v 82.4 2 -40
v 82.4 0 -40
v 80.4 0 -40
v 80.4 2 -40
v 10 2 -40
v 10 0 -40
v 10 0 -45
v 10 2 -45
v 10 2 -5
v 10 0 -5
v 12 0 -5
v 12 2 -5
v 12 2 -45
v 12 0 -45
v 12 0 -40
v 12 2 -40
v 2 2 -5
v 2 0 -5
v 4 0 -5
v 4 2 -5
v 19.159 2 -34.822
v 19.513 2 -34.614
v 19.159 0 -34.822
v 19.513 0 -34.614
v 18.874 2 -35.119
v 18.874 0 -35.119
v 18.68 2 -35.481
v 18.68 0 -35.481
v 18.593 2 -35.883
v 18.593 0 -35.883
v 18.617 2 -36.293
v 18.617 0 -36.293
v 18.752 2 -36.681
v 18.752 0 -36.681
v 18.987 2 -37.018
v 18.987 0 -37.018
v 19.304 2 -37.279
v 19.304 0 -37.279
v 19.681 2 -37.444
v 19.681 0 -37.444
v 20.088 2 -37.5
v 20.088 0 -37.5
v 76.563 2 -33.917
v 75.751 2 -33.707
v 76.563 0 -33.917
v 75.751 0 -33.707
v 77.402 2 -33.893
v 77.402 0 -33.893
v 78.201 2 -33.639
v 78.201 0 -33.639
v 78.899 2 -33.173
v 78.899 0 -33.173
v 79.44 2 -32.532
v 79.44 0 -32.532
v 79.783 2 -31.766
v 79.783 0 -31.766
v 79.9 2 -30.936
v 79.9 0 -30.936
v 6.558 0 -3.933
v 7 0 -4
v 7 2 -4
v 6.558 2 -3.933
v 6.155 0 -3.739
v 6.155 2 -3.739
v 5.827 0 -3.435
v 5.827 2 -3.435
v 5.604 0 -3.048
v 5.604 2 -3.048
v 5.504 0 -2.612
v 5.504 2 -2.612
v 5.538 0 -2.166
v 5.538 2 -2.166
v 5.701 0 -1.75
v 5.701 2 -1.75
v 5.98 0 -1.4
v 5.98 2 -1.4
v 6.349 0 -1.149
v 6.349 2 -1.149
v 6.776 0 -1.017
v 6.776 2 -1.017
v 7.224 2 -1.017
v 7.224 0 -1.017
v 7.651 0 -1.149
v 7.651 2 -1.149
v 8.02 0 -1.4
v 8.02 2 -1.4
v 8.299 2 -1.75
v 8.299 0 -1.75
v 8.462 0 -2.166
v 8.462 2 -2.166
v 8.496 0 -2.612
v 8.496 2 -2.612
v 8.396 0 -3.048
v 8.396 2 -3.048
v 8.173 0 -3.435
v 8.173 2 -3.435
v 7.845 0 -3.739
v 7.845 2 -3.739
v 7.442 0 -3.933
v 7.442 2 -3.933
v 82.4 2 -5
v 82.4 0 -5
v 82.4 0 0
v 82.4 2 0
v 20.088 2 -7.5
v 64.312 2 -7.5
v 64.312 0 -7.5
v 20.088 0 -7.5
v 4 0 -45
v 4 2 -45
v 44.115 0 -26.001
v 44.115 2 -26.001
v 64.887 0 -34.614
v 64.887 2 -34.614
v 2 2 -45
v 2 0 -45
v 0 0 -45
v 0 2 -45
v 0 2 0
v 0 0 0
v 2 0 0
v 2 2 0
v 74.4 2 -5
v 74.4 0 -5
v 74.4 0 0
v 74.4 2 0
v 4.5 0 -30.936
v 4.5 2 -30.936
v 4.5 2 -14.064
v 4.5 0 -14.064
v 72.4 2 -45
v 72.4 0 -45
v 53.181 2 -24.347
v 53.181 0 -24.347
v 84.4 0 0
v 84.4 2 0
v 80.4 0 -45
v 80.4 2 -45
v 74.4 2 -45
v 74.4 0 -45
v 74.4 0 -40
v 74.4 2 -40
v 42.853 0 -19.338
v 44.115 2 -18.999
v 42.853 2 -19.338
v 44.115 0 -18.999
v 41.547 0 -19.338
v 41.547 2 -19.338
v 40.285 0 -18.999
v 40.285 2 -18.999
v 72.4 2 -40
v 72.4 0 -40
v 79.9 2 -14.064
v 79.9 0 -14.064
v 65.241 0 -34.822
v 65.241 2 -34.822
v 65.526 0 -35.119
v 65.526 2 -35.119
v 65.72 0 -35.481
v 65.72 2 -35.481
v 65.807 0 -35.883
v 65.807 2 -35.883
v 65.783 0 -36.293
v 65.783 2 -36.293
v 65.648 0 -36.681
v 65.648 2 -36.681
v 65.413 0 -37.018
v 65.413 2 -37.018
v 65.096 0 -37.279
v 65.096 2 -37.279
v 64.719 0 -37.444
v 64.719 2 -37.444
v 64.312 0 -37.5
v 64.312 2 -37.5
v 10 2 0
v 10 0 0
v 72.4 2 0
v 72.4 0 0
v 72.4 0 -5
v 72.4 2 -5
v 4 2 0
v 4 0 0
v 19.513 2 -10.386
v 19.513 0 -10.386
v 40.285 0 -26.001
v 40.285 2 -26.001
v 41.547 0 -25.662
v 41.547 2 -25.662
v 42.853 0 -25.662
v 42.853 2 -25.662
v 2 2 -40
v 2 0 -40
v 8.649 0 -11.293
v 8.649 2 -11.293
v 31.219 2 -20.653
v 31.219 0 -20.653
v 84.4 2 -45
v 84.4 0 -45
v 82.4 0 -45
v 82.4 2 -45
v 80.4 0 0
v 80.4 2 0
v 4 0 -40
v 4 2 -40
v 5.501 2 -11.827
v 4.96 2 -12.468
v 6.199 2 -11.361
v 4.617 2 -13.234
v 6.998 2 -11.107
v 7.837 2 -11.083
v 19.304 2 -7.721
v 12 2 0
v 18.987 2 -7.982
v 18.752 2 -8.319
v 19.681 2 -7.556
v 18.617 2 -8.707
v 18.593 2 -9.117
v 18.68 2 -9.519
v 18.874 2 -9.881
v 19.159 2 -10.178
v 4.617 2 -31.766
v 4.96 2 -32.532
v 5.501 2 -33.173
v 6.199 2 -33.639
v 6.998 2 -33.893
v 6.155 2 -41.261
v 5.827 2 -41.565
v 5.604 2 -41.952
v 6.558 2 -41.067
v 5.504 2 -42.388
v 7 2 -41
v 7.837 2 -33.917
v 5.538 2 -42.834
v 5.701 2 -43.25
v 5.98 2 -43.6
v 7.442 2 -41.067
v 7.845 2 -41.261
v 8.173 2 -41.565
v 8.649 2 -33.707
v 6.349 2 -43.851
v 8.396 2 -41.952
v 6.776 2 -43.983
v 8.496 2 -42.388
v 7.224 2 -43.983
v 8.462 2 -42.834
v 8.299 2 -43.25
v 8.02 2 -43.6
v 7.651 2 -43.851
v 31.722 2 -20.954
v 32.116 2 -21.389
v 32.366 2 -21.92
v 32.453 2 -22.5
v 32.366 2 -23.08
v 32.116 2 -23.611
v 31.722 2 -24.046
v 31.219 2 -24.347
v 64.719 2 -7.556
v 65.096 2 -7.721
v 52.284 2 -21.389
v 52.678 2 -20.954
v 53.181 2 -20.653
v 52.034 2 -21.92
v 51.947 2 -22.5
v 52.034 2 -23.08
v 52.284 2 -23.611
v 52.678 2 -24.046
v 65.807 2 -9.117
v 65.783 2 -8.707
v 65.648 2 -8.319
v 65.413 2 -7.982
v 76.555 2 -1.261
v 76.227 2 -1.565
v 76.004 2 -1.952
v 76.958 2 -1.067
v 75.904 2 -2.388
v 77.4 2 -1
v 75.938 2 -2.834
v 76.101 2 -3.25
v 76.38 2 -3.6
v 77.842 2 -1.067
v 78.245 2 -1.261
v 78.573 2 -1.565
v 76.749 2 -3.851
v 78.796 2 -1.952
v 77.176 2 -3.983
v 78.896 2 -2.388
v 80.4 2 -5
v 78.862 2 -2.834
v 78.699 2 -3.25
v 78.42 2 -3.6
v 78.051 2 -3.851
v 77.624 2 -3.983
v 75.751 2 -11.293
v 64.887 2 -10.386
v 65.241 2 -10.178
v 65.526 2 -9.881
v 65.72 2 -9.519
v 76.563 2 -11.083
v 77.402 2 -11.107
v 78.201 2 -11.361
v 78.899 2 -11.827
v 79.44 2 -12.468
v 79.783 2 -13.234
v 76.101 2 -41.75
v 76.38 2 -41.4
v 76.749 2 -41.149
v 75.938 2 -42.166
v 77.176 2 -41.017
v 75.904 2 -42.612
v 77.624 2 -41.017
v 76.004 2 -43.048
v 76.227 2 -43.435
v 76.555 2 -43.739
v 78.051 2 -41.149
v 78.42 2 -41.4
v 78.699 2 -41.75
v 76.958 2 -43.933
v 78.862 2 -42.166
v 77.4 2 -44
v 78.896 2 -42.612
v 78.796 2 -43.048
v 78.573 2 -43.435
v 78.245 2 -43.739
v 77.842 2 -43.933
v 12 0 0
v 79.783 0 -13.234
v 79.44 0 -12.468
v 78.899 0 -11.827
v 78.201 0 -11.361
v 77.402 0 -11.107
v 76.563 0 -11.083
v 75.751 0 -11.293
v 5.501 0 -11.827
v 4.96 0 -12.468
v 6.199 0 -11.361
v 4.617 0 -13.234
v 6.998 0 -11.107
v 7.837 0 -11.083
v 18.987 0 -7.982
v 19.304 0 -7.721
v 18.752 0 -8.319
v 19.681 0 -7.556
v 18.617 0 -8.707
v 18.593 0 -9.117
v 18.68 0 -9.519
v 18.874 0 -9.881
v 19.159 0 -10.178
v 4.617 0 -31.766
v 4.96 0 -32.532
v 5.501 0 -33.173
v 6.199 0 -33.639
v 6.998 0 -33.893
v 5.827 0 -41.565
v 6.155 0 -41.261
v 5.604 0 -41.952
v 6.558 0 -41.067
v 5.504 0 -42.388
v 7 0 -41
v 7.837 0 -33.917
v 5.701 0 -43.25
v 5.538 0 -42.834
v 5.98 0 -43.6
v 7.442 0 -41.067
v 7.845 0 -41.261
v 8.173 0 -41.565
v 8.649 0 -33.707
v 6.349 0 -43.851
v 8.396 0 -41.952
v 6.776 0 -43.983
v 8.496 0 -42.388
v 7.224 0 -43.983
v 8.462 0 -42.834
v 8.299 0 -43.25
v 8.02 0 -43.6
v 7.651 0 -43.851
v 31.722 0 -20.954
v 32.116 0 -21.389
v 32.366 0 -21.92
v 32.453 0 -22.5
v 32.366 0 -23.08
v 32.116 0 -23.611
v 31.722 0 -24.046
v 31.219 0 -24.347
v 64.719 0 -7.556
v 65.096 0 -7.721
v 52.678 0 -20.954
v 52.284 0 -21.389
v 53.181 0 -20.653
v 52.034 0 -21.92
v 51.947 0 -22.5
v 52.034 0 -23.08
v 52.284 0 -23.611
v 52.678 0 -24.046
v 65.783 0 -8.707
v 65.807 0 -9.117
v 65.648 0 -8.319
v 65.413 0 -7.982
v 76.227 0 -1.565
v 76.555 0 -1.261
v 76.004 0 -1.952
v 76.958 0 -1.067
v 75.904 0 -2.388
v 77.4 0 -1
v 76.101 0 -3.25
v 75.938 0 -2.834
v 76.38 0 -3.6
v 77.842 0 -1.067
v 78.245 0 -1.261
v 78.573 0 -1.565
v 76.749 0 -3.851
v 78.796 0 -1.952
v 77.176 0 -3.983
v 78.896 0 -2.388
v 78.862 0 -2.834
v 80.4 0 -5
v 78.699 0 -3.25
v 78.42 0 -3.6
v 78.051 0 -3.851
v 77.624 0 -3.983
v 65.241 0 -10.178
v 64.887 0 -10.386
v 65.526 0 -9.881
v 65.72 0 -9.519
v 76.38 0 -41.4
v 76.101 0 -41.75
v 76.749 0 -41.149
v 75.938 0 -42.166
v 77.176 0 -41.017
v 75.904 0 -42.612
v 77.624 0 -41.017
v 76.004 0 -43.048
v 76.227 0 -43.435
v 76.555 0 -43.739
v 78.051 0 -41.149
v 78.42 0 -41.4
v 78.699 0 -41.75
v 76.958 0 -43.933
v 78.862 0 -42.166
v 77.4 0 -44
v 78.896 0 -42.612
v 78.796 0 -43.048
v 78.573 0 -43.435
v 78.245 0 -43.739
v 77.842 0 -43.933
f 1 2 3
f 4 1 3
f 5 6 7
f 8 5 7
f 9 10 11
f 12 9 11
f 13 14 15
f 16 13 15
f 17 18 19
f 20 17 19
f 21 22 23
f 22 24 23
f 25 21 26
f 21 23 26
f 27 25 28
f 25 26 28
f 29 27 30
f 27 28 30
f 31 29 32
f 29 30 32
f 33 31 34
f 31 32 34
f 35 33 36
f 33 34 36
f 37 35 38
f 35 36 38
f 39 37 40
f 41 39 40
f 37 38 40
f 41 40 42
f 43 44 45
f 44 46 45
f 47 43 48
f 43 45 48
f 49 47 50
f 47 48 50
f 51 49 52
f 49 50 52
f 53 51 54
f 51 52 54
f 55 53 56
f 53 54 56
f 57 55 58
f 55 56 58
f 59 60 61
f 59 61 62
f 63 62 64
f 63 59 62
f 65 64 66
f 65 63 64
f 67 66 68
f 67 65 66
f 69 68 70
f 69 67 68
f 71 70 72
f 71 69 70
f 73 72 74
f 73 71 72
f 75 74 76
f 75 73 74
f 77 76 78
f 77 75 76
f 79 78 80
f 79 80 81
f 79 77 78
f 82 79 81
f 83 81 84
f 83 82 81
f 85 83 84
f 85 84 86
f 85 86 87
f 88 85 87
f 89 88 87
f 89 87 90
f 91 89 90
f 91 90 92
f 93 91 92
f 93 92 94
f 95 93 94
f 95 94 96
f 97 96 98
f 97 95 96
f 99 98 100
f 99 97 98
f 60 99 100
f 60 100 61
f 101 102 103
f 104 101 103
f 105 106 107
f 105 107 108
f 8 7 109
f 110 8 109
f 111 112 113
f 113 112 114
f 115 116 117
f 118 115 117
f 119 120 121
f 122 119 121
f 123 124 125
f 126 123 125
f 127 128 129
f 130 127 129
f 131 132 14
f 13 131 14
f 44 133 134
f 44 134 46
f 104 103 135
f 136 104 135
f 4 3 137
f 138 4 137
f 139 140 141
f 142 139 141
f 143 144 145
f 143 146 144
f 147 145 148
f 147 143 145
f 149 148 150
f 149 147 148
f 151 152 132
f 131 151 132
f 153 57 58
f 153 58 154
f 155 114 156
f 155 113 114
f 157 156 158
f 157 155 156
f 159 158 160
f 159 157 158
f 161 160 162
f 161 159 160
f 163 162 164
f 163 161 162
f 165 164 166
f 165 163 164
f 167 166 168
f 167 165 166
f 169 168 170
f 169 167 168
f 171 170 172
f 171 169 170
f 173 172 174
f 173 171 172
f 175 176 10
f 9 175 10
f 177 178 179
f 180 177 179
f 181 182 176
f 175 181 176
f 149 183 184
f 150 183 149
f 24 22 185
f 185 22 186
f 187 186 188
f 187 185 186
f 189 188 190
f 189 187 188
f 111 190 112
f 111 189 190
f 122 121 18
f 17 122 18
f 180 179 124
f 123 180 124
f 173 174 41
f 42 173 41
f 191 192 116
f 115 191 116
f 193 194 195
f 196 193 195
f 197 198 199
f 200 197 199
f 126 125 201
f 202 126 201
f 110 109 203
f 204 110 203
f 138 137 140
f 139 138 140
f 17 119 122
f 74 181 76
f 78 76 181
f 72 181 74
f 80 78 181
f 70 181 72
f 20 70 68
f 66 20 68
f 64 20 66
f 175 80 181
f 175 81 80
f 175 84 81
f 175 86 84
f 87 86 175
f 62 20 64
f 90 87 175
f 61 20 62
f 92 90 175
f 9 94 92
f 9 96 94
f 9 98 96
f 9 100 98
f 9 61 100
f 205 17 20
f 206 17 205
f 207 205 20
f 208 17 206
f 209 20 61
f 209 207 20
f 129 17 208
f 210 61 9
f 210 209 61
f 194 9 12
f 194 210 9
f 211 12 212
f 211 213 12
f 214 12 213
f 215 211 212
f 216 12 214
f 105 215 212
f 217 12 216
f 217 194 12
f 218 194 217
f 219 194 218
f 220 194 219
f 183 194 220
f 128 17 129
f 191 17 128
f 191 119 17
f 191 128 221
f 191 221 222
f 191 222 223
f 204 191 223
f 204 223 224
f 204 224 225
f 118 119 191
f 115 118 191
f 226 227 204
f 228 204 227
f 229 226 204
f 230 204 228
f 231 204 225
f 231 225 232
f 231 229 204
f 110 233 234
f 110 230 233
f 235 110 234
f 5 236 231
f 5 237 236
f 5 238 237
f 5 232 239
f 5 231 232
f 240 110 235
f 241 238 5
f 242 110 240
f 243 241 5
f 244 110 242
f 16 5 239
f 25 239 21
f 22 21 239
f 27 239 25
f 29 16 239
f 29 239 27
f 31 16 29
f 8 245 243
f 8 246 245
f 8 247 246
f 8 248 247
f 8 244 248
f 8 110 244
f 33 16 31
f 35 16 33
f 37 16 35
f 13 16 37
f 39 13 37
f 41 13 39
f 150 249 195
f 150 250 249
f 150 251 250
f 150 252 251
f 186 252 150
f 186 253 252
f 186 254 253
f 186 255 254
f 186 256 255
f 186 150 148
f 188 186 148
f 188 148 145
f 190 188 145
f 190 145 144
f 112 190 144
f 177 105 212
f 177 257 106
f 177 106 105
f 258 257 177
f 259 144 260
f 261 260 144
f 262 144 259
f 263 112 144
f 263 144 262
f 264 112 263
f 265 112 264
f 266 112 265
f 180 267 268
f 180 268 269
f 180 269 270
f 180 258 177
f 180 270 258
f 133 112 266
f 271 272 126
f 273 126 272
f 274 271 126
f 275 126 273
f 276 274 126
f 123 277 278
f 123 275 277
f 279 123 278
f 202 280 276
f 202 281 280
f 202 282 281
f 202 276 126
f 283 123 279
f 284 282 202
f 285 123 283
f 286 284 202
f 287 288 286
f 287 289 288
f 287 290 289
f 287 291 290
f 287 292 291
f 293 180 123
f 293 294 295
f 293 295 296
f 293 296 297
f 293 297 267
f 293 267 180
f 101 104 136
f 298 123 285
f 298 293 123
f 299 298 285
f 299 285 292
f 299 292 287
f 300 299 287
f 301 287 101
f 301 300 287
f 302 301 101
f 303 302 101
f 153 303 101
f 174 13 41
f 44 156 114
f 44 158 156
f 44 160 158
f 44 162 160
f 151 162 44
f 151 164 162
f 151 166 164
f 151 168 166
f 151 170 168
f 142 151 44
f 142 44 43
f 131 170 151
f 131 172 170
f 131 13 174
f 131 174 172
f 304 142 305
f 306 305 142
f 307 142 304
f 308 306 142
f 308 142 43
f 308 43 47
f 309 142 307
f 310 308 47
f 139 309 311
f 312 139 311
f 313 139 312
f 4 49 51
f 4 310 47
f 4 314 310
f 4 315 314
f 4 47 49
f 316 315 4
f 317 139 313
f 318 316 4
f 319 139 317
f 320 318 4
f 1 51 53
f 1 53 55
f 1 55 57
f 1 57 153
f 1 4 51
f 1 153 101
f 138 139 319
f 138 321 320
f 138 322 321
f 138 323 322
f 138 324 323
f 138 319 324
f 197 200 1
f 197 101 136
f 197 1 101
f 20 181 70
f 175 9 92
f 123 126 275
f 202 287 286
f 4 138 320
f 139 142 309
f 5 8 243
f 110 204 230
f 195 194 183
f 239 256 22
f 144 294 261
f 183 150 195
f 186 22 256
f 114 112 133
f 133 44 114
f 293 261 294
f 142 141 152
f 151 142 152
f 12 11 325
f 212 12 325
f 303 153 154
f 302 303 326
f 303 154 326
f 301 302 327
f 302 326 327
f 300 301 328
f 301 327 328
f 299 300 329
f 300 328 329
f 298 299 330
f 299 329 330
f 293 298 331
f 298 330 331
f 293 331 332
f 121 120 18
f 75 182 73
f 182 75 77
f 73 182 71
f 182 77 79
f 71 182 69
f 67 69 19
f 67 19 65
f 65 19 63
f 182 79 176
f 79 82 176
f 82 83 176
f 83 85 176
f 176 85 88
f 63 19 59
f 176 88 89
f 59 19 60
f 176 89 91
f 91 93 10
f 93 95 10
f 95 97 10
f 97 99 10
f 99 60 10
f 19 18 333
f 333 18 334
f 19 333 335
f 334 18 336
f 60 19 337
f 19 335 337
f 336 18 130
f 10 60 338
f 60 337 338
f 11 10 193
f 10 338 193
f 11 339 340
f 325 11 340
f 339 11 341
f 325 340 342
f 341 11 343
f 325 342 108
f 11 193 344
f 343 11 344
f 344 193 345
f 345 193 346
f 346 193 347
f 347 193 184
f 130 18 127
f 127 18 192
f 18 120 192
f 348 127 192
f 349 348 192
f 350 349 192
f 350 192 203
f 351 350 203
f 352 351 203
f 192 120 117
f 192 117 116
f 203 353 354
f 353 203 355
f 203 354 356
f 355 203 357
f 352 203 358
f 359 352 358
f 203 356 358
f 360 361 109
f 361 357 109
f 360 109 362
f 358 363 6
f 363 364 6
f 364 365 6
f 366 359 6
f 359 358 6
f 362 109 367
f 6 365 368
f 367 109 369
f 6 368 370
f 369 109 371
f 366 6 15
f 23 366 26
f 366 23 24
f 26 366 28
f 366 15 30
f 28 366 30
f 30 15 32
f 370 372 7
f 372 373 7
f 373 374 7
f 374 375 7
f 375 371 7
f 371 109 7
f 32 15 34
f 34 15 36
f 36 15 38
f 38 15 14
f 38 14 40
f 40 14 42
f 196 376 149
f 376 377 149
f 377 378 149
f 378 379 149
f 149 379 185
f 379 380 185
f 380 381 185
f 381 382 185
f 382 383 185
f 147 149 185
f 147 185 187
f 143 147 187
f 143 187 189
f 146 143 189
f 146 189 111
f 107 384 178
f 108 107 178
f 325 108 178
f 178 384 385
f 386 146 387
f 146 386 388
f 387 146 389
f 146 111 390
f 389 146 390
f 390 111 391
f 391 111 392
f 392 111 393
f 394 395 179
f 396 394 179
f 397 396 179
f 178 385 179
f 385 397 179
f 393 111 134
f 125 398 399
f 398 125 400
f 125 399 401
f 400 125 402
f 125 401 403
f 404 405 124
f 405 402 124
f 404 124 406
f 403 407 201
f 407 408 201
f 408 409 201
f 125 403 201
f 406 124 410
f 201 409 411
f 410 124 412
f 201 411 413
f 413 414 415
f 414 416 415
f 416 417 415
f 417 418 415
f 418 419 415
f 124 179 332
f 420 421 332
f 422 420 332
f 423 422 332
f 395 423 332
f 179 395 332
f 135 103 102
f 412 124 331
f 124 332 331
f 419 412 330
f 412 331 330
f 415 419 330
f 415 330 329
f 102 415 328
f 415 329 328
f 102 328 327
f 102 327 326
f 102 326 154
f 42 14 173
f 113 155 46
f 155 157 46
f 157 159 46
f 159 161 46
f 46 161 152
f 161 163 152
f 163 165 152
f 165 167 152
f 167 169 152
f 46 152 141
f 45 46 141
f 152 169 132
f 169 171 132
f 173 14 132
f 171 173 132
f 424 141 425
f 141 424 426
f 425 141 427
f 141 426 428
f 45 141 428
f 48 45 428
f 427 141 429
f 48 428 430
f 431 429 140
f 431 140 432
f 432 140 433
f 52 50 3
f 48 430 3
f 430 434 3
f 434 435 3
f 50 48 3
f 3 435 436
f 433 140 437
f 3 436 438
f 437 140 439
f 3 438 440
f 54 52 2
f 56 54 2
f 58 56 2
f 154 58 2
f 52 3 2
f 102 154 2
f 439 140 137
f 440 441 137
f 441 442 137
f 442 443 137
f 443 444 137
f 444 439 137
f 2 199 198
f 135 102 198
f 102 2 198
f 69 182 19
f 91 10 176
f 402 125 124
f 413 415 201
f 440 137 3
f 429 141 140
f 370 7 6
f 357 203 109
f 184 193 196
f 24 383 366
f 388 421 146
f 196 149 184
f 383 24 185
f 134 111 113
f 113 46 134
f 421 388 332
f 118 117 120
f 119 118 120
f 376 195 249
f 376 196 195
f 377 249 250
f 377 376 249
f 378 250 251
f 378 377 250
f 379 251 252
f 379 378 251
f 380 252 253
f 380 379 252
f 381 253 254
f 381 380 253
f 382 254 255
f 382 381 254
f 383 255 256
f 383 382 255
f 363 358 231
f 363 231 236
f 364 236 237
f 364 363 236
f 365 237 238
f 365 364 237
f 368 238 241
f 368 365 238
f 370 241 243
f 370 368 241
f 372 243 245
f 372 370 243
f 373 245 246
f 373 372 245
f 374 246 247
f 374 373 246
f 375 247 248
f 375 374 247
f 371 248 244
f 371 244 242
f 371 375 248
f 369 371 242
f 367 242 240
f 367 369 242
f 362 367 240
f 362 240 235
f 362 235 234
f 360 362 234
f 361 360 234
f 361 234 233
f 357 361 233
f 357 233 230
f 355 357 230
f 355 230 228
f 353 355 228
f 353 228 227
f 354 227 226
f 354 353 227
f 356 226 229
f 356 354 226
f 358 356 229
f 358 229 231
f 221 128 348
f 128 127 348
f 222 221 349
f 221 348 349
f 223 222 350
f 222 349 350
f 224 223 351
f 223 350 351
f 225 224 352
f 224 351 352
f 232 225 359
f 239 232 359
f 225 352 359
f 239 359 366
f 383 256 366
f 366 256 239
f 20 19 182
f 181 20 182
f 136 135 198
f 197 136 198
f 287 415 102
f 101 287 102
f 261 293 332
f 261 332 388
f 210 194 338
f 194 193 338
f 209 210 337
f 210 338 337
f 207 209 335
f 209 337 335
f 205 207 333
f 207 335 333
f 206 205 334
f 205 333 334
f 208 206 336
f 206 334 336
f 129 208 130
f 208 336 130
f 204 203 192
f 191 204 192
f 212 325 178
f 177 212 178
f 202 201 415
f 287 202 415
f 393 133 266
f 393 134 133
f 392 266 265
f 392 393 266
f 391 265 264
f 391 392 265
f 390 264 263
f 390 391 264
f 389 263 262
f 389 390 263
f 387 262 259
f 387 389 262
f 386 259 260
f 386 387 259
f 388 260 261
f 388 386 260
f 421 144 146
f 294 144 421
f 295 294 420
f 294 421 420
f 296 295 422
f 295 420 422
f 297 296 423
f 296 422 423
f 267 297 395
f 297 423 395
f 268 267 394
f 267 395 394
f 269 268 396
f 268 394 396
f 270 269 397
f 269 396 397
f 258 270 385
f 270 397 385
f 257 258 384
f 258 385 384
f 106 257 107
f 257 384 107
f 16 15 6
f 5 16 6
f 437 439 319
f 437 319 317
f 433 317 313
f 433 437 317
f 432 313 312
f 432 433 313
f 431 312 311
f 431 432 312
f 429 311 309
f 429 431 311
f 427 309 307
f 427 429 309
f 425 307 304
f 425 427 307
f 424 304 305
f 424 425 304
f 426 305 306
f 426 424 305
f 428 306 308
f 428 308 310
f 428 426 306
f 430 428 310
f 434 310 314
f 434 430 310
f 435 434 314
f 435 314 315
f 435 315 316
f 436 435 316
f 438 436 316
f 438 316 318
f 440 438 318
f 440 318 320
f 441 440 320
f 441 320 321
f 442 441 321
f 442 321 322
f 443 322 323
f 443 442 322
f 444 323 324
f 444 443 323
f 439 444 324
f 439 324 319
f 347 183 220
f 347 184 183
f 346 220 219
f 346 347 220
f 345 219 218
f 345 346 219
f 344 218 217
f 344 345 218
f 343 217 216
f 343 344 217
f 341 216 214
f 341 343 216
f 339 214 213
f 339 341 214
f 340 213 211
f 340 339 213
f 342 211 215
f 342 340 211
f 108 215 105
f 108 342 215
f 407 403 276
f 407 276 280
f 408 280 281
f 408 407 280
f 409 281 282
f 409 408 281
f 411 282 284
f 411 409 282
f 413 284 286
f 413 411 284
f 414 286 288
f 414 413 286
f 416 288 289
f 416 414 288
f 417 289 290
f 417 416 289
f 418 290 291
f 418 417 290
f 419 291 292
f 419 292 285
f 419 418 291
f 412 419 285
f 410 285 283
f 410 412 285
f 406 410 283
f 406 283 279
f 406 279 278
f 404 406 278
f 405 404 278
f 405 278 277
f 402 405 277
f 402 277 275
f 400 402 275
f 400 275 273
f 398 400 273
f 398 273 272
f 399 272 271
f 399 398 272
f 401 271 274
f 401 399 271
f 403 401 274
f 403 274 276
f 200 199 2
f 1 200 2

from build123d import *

# Parameters (mm, degrees)
SKETCH1_R           = 1.5
BOSS_EXTRUDE1_DEPTH = 2
CUT_EXTRUDE2_DEPTH  = 10
FILLET30_R          = 1.5
FILLET31_R          = 5
FILLET32_R          = 2
FILLET33_R          = 3


with BuildPart() as part:
    # Sketch1 → Boss-Extrude1 (new body)
    with BuildSketch(Plane(origin=(0, 0, 0), x_dir=(1, 0, 0), z_dir=(0, 1, 0))):
        Polygon((0, 0), (2, 0), (2, 5), (4, 5), (4, 0), (10, 0), (10, 5), (12, 5), (12, 0), (72.4, 0), (72.4, 5), (74.4, 5), (74.4, 0), (80.4, 0), (80.4, 5), (82.4, 5), (82.4, 0), (84.4, 0), (84.4, 45), (82.4, 45), (82.4, 40), (80.4, 40), (80.4, 45), (74.4, 45), (74.4, 40), (72.4, 40), (72.4, 45), (12, 45), (12, 40), (10, 40), (10, 45), (4, 45), (4, 40), (2, 40), (2, 45), (0, 45), align=None)
        with Locations(Location((7, 42.5, 0), (0, 0, 270))):
            Circle(SKETCH1_R, mode=Mode.SUBTRACT)
        with Locations(Location((77.4, 42.5, 0), (0, 0, 90))):
            Circle(SKETCH1_R, mode=Mode.SUBTRACT)
        with Locations(Location((7, 2.5, 0), (0, 0, 90))):
            Circle(SKETCH1_R, mode=Mode.SUBTRACT)
        with Locations(Location((77.4, 2.5, 0), (0, 0, 270))):
            Circle(SKETCH1_R, mode=Mode.SUBTRACT)
    extrude(amount=BOSS_EXTRUDE1_DEPTH)

    # Sketch3 → Cut-Extrude2 (cut)
    with BuildSketch(Plane(origin=(0, 2, 0), x_dir=(1, 0, 0), z_dir=(0, 1, 0))):
        Polygon((71.845045693, 7.5), (12.554954307, 7.5), (42.2, 19.793561603), align=None)
        Polygon((4.5, 35.427447859), (4.5, 9.572552141), (35.673617122, 22.5), align=None)
        Polygon((12.554954307, 37.5), (42.2, 25.206438397), (71.845045693, 37.5), align=None)
        Polygon((79.9, 35.427447859), (79.9, 9.572552141), (48.726382878, 22.5), align=None)
    extrude(amount=-CUT_EXTRUDE2_DEPTH, mode=Mode.SUBTRACT)

    # Fillet30
    fillet30_edges = [part.edges().sort_by_distance(p)[0] for p in [
        (12.554954307, 1, -7.5),
        (71.845045693, 1, -7.5),
        (71.845045693, 1, -37.5),
        (12.554954307, 1, -37.5),
    ]]
    fillet(fillet30_edges, radius=FILLET30_R)

    # Fillet31
    fillet31_edges = [part.edges().sort_by_distance(p)[0] for p in [
        (42.2, 1, -19.793561603),
        (42.2, 1, -25.206438397),
    ]]
    fillet(fillet31_edges, radius=FILLET31_R)

    # Fillet32
    fillet32_edges = [part.edges().sort_by_distance(p)[0] for p in [
        (35.673617122, 1, -22.5),
        (48.726382878, 1, -22.5),
    ]]
    fillet(fillet32_edges, radius=FILLET32_R)

    # Fillet33
    fillet33_edges = [part.edges().sort_by_distance(p)[0] for p in [
        (4.5, 1, -9.572552141),
        (4.5, 1, -35.427447859),
        (79.9, 1, -35.427447859),
        (79.9, 1, -9.572552141),
    ]]
    fillet(fillet33_edges, radius=FILLET33_R)


solid = part.part
